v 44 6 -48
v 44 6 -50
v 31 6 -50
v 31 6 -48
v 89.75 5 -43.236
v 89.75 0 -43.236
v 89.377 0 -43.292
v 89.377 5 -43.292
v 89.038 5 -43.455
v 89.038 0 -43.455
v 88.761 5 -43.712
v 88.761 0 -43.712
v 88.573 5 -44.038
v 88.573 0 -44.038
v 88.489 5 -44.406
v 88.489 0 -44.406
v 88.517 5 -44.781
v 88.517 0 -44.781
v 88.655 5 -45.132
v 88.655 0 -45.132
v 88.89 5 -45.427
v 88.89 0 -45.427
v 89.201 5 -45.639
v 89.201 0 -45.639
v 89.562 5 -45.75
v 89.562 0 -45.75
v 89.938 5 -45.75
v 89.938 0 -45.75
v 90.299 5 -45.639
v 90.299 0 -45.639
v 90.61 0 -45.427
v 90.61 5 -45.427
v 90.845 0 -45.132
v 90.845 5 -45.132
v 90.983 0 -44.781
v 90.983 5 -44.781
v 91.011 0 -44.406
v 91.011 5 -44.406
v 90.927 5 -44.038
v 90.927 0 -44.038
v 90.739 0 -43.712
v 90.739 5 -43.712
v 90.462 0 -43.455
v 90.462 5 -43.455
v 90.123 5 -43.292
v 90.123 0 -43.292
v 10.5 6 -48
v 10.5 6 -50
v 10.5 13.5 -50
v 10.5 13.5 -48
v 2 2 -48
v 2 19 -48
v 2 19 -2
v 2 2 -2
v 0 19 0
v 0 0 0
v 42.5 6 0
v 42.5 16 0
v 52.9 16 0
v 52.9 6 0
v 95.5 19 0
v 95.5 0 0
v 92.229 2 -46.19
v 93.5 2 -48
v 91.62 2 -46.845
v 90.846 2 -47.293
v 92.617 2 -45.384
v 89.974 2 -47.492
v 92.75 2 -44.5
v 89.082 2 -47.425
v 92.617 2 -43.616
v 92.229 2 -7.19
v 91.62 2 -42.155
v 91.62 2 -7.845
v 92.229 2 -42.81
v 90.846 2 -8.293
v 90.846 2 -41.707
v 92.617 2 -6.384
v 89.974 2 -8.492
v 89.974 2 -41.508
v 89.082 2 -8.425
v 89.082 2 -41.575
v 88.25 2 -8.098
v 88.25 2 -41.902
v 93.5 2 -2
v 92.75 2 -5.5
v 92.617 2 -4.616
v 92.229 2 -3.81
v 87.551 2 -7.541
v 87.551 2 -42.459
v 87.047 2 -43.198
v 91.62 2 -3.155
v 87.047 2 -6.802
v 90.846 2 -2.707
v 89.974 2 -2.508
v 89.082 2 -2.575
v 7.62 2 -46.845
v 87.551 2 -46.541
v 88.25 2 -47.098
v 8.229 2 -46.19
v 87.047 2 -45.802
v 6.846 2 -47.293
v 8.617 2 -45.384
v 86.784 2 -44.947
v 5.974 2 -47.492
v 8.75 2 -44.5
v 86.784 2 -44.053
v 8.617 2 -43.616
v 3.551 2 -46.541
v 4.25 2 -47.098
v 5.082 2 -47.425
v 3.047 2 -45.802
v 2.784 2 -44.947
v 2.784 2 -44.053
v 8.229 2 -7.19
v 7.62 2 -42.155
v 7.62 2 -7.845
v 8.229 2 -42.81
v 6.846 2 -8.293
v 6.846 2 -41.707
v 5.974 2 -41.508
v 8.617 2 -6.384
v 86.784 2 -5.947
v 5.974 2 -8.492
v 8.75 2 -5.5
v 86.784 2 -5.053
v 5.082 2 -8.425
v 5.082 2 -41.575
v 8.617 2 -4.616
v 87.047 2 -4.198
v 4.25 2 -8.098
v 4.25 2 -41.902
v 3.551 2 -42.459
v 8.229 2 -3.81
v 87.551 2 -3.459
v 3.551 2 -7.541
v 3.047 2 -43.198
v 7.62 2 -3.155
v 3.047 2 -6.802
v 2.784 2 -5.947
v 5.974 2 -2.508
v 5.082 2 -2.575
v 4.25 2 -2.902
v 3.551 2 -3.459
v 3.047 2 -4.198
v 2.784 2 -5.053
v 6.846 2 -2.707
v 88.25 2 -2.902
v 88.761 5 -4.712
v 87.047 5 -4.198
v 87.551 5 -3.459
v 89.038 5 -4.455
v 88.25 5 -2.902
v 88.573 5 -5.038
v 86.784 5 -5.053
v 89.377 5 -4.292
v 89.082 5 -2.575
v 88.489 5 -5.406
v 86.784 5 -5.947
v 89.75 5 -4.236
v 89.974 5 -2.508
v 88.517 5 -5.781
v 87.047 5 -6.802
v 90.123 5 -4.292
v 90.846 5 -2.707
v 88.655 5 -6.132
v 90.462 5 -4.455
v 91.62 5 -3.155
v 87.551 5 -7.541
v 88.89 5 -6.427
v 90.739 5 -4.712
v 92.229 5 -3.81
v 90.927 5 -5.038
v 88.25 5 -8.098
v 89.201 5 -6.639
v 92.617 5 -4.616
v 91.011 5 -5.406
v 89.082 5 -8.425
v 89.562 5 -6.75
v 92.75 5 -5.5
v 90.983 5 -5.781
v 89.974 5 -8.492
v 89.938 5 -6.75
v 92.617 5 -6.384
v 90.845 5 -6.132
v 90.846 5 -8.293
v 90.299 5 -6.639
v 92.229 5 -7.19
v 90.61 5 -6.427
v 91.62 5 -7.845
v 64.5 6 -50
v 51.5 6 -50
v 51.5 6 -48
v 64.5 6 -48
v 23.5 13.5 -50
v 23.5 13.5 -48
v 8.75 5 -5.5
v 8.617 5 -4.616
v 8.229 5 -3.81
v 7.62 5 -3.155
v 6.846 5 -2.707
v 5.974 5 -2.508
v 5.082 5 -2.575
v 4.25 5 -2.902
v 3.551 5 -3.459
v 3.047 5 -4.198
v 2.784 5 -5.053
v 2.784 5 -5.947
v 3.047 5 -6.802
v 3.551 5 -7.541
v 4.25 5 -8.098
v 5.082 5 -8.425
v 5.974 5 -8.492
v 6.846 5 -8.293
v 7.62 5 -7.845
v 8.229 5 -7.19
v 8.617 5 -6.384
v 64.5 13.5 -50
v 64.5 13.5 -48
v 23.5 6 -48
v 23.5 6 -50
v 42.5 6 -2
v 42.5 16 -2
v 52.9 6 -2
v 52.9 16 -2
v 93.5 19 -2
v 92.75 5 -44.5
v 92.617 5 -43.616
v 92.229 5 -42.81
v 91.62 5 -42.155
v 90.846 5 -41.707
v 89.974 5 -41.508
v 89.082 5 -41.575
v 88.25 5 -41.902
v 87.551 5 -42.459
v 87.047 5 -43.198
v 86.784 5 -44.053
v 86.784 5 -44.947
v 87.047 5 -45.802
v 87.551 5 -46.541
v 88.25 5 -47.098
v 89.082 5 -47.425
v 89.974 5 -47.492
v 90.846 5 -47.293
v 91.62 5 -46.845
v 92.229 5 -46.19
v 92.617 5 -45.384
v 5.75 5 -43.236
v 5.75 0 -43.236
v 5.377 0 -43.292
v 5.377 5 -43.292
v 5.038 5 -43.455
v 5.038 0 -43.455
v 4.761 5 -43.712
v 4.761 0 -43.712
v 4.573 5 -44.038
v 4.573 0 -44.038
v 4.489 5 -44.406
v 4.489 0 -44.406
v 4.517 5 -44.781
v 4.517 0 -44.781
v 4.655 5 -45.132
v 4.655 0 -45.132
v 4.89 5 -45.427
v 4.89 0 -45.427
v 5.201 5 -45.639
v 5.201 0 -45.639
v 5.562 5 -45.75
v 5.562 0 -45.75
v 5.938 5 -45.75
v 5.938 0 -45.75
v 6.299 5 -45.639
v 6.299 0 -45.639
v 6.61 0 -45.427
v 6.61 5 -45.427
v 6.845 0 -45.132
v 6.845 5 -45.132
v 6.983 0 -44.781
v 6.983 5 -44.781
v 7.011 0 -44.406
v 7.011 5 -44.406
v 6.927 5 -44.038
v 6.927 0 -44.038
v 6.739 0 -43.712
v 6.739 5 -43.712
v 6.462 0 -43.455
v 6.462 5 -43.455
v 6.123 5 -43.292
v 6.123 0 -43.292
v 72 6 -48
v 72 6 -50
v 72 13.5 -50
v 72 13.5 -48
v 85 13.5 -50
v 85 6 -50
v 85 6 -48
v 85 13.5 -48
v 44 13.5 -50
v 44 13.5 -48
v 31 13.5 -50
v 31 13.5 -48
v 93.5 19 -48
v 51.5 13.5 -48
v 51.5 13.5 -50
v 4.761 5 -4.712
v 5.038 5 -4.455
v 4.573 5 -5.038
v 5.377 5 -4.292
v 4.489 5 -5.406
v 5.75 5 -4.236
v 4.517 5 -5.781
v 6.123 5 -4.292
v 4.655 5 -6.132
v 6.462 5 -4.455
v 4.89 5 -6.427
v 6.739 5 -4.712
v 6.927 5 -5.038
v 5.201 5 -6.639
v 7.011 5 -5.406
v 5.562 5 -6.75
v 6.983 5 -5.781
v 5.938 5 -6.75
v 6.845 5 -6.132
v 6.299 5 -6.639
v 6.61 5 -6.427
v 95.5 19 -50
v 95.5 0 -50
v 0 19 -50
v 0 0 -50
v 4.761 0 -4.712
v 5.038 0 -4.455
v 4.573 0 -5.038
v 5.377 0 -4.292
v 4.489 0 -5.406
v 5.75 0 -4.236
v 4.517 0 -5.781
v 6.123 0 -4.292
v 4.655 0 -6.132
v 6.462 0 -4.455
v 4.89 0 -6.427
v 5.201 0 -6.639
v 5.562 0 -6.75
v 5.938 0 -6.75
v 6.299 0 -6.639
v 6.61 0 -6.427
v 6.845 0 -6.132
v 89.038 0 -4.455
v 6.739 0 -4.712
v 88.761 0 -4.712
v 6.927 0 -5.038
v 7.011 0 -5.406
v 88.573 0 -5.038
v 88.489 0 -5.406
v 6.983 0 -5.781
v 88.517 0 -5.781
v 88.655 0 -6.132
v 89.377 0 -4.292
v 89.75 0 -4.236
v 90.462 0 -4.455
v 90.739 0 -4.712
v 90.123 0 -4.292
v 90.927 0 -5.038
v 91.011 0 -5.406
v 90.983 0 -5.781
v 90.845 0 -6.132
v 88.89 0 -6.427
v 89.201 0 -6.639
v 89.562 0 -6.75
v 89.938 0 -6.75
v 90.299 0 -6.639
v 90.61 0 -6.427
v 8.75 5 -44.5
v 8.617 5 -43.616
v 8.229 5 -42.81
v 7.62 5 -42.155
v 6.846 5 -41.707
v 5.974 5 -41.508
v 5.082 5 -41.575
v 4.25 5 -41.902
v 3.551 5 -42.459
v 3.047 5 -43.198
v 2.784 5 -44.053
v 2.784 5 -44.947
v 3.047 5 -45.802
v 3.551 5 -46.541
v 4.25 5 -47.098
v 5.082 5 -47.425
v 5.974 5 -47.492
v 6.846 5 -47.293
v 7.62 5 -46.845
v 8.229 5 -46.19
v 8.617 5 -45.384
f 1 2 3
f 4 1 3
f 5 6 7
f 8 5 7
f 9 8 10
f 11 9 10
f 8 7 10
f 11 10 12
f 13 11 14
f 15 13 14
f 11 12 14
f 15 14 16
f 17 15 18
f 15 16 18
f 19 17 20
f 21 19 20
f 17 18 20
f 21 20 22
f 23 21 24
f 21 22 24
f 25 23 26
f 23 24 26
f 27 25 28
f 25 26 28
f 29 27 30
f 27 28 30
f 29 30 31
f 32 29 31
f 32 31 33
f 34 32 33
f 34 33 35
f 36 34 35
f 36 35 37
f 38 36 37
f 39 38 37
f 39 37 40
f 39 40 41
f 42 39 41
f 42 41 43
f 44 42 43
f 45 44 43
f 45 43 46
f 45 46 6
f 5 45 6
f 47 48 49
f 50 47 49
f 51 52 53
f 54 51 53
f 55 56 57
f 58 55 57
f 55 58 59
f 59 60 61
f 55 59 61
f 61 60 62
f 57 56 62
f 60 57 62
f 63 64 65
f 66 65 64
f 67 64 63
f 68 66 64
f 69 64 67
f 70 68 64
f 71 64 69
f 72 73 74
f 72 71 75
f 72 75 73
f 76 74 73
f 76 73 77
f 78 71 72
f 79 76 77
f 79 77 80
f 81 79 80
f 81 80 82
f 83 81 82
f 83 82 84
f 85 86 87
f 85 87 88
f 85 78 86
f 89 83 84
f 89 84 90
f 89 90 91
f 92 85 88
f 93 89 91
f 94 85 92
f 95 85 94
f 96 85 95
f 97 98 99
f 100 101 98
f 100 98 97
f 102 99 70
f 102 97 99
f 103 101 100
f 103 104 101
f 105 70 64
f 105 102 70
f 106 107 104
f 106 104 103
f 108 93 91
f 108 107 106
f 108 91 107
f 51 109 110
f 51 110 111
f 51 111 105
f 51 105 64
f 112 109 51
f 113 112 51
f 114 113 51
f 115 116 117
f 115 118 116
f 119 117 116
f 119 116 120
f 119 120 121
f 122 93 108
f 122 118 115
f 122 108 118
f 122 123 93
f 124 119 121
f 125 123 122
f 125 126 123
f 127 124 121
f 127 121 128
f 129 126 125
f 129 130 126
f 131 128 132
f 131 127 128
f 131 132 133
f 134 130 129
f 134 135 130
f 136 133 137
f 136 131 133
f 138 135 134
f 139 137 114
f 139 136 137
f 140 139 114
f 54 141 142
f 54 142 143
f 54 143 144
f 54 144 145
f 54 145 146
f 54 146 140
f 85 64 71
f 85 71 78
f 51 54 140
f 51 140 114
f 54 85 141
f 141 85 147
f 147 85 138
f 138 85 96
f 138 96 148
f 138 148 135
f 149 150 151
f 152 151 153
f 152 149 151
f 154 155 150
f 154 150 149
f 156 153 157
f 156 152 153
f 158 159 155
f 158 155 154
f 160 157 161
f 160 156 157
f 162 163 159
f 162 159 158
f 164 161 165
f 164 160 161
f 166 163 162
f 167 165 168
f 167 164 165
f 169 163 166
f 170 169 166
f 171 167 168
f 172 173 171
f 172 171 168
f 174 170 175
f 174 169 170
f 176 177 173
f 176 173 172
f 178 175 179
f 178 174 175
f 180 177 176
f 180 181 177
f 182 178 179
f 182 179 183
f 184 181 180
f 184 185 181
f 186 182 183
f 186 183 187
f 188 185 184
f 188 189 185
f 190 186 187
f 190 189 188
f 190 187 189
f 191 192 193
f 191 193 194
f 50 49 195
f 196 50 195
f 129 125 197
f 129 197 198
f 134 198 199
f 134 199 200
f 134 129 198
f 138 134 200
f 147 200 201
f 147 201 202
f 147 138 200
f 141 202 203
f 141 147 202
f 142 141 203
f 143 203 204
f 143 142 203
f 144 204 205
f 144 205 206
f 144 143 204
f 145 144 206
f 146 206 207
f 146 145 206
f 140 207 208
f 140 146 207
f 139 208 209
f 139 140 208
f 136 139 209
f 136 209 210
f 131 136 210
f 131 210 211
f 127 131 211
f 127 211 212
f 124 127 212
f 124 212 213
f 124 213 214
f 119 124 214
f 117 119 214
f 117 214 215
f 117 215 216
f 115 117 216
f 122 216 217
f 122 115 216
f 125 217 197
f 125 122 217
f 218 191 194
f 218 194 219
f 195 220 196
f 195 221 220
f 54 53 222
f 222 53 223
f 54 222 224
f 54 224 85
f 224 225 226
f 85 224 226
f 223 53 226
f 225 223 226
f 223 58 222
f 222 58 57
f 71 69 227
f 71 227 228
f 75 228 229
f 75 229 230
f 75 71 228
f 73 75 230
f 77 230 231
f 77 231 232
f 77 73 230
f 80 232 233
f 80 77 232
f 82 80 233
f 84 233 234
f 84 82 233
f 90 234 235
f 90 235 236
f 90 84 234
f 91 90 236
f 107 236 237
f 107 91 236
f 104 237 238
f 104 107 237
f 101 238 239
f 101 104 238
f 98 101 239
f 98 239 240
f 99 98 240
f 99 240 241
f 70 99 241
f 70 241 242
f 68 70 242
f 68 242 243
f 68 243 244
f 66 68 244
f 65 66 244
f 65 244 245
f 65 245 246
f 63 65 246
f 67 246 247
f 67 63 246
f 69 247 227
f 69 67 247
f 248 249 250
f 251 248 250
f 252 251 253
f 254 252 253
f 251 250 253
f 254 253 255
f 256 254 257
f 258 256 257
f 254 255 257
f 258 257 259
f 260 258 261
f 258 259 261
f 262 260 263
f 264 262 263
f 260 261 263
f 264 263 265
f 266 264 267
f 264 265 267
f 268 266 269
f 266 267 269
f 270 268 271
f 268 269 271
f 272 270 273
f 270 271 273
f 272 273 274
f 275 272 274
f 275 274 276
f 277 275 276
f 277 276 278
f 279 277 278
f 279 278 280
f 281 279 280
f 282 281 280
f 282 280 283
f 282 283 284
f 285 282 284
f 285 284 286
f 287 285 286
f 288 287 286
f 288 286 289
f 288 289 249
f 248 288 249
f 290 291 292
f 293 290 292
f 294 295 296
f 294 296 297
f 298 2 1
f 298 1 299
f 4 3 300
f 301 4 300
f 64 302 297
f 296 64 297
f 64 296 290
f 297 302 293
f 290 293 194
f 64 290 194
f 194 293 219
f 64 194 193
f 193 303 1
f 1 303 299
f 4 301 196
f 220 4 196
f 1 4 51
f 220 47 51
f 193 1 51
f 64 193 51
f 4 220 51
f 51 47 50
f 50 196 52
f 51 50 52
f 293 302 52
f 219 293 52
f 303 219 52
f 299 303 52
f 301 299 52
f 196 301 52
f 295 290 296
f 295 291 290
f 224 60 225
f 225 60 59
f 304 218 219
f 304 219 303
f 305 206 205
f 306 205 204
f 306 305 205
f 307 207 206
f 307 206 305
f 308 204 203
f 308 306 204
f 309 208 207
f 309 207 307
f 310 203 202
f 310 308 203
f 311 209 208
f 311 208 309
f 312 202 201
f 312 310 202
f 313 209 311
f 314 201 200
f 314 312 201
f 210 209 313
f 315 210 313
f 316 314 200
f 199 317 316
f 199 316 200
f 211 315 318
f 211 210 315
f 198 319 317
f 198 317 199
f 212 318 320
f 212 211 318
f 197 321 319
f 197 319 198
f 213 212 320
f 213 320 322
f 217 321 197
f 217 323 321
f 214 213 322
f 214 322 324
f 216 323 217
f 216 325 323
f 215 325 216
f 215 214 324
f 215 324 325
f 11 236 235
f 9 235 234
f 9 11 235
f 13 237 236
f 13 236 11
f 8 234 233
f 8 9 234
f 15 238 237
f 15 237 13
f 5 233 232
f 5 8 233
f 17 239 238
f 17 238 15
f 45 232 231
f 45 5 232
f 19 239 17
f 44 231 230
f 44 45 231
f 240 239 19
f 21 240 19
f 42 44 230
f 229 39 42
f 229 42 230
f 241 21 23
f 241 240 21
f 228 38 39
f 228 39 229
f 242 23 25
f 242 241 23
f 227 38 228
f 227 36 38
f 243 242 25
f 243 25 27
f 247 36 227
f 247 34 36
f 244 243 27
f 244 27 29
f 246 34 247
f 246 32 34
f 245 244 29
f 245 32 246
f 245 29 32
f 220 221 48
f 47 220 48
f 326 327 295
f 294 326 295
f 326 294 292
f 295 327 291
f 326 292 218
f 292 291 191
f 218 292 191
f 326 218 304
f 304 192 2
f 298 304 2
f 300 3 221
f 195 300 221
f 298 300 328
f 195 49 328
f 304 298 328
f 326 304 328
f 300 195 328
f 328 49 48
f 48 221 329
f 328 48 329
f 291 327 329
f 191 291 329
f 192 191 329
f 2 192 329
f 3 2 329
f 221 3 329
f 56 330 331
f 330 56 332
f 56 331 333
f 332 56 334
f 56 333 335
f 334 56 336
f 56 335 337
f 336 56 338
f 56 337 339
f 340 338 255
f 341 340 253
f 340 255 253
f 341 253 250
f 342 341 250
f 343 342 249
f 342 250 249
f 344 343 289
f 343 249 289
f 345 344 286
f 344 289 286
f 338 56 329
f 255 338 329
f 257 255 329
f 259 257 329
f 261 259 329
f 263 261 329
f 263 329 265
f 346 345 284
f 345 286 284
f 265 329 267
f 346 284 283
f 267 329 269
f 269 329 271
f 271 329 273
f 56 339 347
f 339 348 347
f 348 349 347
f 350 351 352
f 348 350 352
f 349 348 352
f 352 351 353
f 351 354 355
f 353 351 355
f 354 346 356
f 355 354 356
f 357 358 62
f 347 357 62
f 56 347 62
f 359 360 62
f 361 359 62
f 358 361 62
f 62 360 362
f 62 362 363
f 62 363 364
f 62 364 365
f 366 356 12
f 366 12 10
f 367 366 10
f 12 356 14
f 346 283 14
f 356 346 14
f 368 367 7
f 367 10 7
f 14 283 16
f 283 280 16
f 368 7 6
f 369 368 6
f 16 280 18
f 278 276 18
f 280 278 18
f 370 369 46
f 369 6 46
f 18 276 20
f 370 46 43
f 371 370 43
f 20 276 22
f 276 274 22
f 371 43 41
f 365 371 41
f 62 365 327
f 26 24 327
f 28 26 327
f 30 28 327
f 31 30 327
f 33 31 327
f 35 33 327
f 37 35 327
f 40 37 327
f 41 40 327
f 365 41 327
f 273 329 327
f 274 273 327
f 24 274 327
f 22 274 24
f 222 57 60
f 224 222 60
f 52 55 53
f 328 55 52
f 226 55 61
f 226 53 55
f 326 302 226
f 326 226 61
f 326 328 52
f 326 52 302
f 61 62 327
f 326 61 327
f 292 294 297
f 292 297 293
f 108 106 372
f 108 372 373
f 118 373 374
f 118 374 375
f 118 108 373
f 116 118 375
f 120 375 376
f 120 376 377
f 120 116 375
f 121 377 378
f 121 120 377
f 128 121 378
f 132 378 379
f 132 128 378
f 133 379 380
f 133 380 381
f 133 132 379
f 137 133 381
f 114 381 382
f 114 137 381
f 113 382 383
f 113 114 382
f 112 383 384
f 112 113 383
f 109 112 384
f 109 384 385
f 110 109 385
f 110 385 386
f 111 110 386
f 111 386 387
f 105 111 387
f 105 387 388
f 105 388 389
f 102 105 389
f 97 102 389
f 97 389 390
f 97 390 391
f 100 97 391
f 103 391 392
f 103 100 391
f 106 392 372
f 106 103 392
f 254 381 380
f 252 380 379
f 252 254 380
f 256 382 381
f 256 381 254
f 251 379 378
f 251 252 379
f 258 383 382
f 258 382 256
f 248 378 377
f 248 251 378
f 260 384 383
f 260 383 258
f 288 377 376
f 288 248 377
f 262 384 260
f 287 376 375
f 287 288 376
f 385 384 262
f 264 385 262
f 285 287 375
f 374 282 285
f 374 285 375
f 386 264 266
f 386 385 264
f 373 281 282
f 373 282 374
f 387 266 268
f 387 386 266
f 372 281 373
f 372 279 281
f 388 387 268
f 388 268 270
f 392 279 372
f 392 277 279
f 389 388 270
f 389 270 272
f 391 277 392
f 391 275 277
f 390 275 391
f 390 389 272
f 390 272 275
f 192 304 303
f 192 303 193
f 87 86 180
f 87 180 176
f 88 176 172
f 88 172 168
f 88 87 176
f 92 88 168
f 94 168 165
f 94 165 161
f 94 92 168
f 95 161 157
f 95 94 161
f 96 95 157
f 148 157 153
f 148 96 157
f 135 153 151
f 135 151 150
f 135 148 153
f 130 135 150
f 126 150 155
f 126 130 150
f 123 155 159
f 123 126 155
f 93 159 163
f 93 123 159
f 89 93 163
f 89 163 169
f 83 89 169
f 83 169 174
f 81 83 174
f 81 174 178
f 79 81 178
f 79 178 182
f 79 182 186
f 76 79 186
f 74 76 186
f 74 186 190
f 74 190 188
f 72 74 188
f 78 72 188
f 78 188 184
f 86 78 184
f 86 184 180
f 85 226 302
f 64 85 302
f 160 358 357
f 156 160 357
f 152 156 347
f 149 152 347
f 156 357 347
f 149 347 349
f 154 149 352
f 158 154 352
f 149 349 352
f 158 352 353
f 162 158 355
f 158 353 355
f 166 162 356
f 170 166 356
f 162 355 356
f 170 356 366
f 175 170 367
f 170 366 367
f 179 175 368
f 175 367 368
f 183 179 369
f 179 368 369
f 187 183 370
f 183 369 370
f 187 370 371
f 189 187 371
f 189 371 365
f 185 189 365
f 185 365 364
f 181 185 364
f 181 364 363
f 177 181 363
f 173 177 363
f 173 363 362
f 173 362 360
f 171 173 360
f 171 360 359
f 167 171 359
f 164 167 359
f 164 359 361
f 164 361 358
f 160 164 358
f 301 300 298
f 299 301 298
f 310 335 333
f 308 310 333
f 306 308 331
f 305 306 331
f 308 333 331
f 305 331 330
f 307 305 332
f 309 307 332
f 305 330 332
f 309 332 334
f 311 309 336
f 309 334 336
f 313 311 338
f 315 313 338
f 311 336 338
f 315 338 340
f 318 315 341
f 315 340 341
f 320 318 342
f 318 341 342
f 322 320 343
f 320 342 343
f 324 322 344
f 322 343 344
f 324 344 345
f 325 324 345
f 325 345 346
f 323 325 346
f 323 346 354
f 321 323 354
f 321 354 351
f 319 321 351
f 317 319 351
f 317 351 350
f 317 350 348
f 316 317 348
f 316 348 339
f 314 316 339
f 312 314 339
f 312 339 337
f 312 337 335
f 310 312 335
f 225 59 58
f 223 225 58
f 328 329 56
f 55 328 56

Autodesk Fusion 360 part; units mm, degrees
sketch "Sketch1" plane through (0, 0, 0) normal (0, 1, 0) x (1, 0, 0)
  line L0 (0, 0) -> (95.5, 0)
  line L1 (95.5, 0) -> (95.5, 50)
  line L2 (95.5, 50) -> (0, 50)
  line L3 (0, 50) -> (0, 0)
  dimension "d1" = 95.5
  dimension "d2" = 50
extrude "Extrude1" add sketch "Sketch1" along normal blind 19
sketch "Sketch6" plane through (0, 19, 0) normal (0, 1, 0) x (-1, 0, 0)
  line L0 (0, -50) -> (0, 0)
  line L1 (0, 0) -> (-95.5, 0)
  line L2 (-95.5, 0) -> (-95.5, -50)
  line L3 (-95.5, -50) -> (0, -50)
  line L4 (-2, -2) -> (-93.5, -2)
  line L5 (-93.5, -2) -> (-93.5, -48)
  line L6 (-93.5, -48) -> (-2, -48)
  line L7 (-2, -48) -> (-2, -2)
  dimension "d39" = 91.5
  dimension "d40" = 46
extrude "Extrude5" cut sketch "Sketch6" against normal blind 17 contours L4 L5 L6 L7
sketch "Sketch8" plane through (0, 0, 0) normal (0, 0, 1) x (1, 0, 0)
  line L0 (0, 0) -> (95.5, 0)
  line L1 (95.5, 0) -> (95.5, 19)
  line L2 (95.5, 19) -> (0, 19)
  line L3 (0, 19) -> (0, 0)
  line L4 (0, 19) -> (42.5, 19)
  line L5 (42.5, 19) -> (42.5, 6)
  line L6 (42.5, 6) -> (0, 6)
  line L7 (0, 6) -> (0, 19)
  line L8 (42.5, 6) -> (52.9, 6)
  line L9 (52.9, 6) -> (52.9, 16)
  line L10 (52.9, 16) -> (42.5, 16)
  line L11 (42.5, 16) -> (42.5, 6)
  dimension "d66" = 42.5
  dimension "d67" = 13
  dimension "d68" = 10.4
  dimension "d69" = 10
extrude "Extrude7" cut sketch "Sketch8" against normal blind 2 contours L5 L8 L9 L10 L11
sketch "Sketch9" plane through (0, 0, -50) normal (0, 0, -1) x (-1, 0, 0)
  line L0 (-95.5, 0) -> (0, 0)
  line L1 (0, 0) -> (0, 19)
  line L2 (0, 19) -> (-95.5, 19)
  line L3 (-95.5, 19) -> (-95.5, 0)
  line L4 (-95.5, 19) -> (-51.5, 19)
  line L5 (-51.5, 19) -> (-51.5, 6)
  line L6 (-51.5, 6) -> (-95.5, 6)
  line L7 (-95.5, 6) -> (-95.5, 19)
  line L8 (-51.5, 6) -> (-64.5, 6)
  line L9 (-64.5, 6) -> (-64.5, 13.5)
  line L10 (-64.5, 13.5) -> (-51.5, 13.5)
  line L11 (-51.5, 13.5) -> (-51.5, 6)
  line L12 (-64.5, 6) -> (-72, 6)
  line L13 (-72, 6) -> (-72, 13.5)
  line L14 (-72, 13.5) -> (-64.5, 13.5)
  line L15 (-64.5, 13.5) -> (-64.5, 6)
  line L16 (-72, 6) -> (-85, 6)
  line L17 (-85, 6) -> (-85, 13.5)
  line L18 (-85, 13.5) -> (-72, 13.5)
  line L19 (-72, 13.5) -> (-72, 6)
  line L20 (-51.5, 6) -> (-44, 6)
  line L21 (-44, 6) -> (-44, 13.5)
  line L22 (-44, 13.5) -> (-51.5, 13.5)
  line L23 (-51.5, 13.5) -> (-51.5, 6)
  line L24 (-44, 6) -> (-31, 6)
  line L25 (-31, 6) -> (-31, 13.5)
  line L26 (-31, 13.5) -> (-44, 13.5)
  line L27 (-44, 13.5) -> (-44, 6)
  line L28 (-31, 6) -> (-23.5, 6)
  line L29 (-23.5, 6) -> (-23.5, 13.5)
  line L30 (-23.5, 13.5) -> (-31, 13.5)
  line L31 (-31, 13.5) -> (-31, 6)
  line L32 (-23.5, 6) -> (-10.5, 6)
  line L33 (-10.5, 6) -> (-10.5, 13.5)
  line L34 (-10.5, 13.5) -> (-23.5, 13.5)
  line L35 (-23.5, 13.5) -> (-23.5, 6)
  dimension "d72" = 44
  dimension "d73" = 13
  dimension "d74" = 13
  dimension "d75" = 7.5
  dimension "d76" = 7.5
  dimension "d77" = 7.5
  dimension "d78" = 13
  dimension "d79" = 7.5
  dimension "d80" = 7.5
  dimension "d81" = 7.5
  dimension "d82" = 13
  dimension "d83" = 7.5
  dimension "d84" = 7.5
  dimension "d85" = 7.5
  dimension "d86" = 13
  dimension "d87" = 7.5
extrude "Extrude8" cut sketch "Sketch9" against normal blind 2 contours L6 L13 L16 L17 L18 L19 | L5 L6 L8 L9 L10 L11 L15 L23 | L21 L24 L25 L26 L27 L31 | L29 L32 L33 L34 L35
sketch "Sketch10" plane through (0, 0, 0) normal (0, 1, 0) x (1, 0, 0)
  line L0 (2, 2) -> (5.75, 2)
  line L1 (5.75, 2) -> (5.75, 5.5)
  line L2 (5.75, 5.5) -> (2, 5.5)
  line L3 (2, 5.5) -> (2, 2)
  circle A0 centre (5.75, 5.5) radius 3
  line L4 (2, 48) -> (5.75, 48)
  line L5 (5.75, 48) -> (5.75, 44.5)
  line L6 (5.75, 44.5) -> (2, 44.5)
  line L7 (2, 44.5) -> (2, 48)
  circle A1 centre (5.75, 44.5) radius 3
  line L8 (93.5, 48) -> (89.75, 48)
  line L9 (89.75, 48) -> (89.75, 44.5)
  line L10 (89.75, 44.5) -> (93.5, 44.5)
  line L11 (93.5, 44.5) -> (93.5, 48)
  circle A2 centre (89.75, 44.5) radius 3
  line L12 (93.5, 2) -> (89.75, 2)
  line L13 (89.75, 2) -> (89.75, 5.5)
  line L14 (89.75, 5.5) -> (93.5, 5.5)
  line L15 (93.5, 5.5) -> (93.5, 2)
  circle A3 centre (89.75, 5.5) radius 3
  dimension "d93" = 3.75
  dimension "d94" = 3.5
  dimension "d95" = 6
  dimension "d96" = 3.75
  dimension "d97" = 3.5
  dimension "d98" = 6
  dimension "d99" = 3.75
  dimension "d100" = 3.5
  dimension "d101" = 6
  dimension "d102" = 3.75
  dimension "d103" = 3.5
  dimension "d104" = 6
extrude "Extrude9" add sketch "Sketch10" along normal blind 5 contours L1 L2 A0 | L1 L2 A0 | L5 L6 A1 | L5 L6 A1 | L9 L10 A2 | L9 L10 A2 | L13 L14 A3 | L13 L14 A3
hole "Hole5" at (5.75, 5, -44.5) direction (0, -1, 0) diameter 2.529 depth 5 tip angle 180
hole "Hole6" at (89.75, 5, -44.5) direction (0, -1, 0) diameter 2.529 depth 5 tip angle 180
hole "Hole7" at (89.75, 5, -5.5) direction (0, -1, 0) diameter 2.529 depth 5 tip angle 180
hole "Hole8" at (5.75, 5, -5.5) direction (0, -1, 0) diameter 2.529 depth 5 tip angle 180
